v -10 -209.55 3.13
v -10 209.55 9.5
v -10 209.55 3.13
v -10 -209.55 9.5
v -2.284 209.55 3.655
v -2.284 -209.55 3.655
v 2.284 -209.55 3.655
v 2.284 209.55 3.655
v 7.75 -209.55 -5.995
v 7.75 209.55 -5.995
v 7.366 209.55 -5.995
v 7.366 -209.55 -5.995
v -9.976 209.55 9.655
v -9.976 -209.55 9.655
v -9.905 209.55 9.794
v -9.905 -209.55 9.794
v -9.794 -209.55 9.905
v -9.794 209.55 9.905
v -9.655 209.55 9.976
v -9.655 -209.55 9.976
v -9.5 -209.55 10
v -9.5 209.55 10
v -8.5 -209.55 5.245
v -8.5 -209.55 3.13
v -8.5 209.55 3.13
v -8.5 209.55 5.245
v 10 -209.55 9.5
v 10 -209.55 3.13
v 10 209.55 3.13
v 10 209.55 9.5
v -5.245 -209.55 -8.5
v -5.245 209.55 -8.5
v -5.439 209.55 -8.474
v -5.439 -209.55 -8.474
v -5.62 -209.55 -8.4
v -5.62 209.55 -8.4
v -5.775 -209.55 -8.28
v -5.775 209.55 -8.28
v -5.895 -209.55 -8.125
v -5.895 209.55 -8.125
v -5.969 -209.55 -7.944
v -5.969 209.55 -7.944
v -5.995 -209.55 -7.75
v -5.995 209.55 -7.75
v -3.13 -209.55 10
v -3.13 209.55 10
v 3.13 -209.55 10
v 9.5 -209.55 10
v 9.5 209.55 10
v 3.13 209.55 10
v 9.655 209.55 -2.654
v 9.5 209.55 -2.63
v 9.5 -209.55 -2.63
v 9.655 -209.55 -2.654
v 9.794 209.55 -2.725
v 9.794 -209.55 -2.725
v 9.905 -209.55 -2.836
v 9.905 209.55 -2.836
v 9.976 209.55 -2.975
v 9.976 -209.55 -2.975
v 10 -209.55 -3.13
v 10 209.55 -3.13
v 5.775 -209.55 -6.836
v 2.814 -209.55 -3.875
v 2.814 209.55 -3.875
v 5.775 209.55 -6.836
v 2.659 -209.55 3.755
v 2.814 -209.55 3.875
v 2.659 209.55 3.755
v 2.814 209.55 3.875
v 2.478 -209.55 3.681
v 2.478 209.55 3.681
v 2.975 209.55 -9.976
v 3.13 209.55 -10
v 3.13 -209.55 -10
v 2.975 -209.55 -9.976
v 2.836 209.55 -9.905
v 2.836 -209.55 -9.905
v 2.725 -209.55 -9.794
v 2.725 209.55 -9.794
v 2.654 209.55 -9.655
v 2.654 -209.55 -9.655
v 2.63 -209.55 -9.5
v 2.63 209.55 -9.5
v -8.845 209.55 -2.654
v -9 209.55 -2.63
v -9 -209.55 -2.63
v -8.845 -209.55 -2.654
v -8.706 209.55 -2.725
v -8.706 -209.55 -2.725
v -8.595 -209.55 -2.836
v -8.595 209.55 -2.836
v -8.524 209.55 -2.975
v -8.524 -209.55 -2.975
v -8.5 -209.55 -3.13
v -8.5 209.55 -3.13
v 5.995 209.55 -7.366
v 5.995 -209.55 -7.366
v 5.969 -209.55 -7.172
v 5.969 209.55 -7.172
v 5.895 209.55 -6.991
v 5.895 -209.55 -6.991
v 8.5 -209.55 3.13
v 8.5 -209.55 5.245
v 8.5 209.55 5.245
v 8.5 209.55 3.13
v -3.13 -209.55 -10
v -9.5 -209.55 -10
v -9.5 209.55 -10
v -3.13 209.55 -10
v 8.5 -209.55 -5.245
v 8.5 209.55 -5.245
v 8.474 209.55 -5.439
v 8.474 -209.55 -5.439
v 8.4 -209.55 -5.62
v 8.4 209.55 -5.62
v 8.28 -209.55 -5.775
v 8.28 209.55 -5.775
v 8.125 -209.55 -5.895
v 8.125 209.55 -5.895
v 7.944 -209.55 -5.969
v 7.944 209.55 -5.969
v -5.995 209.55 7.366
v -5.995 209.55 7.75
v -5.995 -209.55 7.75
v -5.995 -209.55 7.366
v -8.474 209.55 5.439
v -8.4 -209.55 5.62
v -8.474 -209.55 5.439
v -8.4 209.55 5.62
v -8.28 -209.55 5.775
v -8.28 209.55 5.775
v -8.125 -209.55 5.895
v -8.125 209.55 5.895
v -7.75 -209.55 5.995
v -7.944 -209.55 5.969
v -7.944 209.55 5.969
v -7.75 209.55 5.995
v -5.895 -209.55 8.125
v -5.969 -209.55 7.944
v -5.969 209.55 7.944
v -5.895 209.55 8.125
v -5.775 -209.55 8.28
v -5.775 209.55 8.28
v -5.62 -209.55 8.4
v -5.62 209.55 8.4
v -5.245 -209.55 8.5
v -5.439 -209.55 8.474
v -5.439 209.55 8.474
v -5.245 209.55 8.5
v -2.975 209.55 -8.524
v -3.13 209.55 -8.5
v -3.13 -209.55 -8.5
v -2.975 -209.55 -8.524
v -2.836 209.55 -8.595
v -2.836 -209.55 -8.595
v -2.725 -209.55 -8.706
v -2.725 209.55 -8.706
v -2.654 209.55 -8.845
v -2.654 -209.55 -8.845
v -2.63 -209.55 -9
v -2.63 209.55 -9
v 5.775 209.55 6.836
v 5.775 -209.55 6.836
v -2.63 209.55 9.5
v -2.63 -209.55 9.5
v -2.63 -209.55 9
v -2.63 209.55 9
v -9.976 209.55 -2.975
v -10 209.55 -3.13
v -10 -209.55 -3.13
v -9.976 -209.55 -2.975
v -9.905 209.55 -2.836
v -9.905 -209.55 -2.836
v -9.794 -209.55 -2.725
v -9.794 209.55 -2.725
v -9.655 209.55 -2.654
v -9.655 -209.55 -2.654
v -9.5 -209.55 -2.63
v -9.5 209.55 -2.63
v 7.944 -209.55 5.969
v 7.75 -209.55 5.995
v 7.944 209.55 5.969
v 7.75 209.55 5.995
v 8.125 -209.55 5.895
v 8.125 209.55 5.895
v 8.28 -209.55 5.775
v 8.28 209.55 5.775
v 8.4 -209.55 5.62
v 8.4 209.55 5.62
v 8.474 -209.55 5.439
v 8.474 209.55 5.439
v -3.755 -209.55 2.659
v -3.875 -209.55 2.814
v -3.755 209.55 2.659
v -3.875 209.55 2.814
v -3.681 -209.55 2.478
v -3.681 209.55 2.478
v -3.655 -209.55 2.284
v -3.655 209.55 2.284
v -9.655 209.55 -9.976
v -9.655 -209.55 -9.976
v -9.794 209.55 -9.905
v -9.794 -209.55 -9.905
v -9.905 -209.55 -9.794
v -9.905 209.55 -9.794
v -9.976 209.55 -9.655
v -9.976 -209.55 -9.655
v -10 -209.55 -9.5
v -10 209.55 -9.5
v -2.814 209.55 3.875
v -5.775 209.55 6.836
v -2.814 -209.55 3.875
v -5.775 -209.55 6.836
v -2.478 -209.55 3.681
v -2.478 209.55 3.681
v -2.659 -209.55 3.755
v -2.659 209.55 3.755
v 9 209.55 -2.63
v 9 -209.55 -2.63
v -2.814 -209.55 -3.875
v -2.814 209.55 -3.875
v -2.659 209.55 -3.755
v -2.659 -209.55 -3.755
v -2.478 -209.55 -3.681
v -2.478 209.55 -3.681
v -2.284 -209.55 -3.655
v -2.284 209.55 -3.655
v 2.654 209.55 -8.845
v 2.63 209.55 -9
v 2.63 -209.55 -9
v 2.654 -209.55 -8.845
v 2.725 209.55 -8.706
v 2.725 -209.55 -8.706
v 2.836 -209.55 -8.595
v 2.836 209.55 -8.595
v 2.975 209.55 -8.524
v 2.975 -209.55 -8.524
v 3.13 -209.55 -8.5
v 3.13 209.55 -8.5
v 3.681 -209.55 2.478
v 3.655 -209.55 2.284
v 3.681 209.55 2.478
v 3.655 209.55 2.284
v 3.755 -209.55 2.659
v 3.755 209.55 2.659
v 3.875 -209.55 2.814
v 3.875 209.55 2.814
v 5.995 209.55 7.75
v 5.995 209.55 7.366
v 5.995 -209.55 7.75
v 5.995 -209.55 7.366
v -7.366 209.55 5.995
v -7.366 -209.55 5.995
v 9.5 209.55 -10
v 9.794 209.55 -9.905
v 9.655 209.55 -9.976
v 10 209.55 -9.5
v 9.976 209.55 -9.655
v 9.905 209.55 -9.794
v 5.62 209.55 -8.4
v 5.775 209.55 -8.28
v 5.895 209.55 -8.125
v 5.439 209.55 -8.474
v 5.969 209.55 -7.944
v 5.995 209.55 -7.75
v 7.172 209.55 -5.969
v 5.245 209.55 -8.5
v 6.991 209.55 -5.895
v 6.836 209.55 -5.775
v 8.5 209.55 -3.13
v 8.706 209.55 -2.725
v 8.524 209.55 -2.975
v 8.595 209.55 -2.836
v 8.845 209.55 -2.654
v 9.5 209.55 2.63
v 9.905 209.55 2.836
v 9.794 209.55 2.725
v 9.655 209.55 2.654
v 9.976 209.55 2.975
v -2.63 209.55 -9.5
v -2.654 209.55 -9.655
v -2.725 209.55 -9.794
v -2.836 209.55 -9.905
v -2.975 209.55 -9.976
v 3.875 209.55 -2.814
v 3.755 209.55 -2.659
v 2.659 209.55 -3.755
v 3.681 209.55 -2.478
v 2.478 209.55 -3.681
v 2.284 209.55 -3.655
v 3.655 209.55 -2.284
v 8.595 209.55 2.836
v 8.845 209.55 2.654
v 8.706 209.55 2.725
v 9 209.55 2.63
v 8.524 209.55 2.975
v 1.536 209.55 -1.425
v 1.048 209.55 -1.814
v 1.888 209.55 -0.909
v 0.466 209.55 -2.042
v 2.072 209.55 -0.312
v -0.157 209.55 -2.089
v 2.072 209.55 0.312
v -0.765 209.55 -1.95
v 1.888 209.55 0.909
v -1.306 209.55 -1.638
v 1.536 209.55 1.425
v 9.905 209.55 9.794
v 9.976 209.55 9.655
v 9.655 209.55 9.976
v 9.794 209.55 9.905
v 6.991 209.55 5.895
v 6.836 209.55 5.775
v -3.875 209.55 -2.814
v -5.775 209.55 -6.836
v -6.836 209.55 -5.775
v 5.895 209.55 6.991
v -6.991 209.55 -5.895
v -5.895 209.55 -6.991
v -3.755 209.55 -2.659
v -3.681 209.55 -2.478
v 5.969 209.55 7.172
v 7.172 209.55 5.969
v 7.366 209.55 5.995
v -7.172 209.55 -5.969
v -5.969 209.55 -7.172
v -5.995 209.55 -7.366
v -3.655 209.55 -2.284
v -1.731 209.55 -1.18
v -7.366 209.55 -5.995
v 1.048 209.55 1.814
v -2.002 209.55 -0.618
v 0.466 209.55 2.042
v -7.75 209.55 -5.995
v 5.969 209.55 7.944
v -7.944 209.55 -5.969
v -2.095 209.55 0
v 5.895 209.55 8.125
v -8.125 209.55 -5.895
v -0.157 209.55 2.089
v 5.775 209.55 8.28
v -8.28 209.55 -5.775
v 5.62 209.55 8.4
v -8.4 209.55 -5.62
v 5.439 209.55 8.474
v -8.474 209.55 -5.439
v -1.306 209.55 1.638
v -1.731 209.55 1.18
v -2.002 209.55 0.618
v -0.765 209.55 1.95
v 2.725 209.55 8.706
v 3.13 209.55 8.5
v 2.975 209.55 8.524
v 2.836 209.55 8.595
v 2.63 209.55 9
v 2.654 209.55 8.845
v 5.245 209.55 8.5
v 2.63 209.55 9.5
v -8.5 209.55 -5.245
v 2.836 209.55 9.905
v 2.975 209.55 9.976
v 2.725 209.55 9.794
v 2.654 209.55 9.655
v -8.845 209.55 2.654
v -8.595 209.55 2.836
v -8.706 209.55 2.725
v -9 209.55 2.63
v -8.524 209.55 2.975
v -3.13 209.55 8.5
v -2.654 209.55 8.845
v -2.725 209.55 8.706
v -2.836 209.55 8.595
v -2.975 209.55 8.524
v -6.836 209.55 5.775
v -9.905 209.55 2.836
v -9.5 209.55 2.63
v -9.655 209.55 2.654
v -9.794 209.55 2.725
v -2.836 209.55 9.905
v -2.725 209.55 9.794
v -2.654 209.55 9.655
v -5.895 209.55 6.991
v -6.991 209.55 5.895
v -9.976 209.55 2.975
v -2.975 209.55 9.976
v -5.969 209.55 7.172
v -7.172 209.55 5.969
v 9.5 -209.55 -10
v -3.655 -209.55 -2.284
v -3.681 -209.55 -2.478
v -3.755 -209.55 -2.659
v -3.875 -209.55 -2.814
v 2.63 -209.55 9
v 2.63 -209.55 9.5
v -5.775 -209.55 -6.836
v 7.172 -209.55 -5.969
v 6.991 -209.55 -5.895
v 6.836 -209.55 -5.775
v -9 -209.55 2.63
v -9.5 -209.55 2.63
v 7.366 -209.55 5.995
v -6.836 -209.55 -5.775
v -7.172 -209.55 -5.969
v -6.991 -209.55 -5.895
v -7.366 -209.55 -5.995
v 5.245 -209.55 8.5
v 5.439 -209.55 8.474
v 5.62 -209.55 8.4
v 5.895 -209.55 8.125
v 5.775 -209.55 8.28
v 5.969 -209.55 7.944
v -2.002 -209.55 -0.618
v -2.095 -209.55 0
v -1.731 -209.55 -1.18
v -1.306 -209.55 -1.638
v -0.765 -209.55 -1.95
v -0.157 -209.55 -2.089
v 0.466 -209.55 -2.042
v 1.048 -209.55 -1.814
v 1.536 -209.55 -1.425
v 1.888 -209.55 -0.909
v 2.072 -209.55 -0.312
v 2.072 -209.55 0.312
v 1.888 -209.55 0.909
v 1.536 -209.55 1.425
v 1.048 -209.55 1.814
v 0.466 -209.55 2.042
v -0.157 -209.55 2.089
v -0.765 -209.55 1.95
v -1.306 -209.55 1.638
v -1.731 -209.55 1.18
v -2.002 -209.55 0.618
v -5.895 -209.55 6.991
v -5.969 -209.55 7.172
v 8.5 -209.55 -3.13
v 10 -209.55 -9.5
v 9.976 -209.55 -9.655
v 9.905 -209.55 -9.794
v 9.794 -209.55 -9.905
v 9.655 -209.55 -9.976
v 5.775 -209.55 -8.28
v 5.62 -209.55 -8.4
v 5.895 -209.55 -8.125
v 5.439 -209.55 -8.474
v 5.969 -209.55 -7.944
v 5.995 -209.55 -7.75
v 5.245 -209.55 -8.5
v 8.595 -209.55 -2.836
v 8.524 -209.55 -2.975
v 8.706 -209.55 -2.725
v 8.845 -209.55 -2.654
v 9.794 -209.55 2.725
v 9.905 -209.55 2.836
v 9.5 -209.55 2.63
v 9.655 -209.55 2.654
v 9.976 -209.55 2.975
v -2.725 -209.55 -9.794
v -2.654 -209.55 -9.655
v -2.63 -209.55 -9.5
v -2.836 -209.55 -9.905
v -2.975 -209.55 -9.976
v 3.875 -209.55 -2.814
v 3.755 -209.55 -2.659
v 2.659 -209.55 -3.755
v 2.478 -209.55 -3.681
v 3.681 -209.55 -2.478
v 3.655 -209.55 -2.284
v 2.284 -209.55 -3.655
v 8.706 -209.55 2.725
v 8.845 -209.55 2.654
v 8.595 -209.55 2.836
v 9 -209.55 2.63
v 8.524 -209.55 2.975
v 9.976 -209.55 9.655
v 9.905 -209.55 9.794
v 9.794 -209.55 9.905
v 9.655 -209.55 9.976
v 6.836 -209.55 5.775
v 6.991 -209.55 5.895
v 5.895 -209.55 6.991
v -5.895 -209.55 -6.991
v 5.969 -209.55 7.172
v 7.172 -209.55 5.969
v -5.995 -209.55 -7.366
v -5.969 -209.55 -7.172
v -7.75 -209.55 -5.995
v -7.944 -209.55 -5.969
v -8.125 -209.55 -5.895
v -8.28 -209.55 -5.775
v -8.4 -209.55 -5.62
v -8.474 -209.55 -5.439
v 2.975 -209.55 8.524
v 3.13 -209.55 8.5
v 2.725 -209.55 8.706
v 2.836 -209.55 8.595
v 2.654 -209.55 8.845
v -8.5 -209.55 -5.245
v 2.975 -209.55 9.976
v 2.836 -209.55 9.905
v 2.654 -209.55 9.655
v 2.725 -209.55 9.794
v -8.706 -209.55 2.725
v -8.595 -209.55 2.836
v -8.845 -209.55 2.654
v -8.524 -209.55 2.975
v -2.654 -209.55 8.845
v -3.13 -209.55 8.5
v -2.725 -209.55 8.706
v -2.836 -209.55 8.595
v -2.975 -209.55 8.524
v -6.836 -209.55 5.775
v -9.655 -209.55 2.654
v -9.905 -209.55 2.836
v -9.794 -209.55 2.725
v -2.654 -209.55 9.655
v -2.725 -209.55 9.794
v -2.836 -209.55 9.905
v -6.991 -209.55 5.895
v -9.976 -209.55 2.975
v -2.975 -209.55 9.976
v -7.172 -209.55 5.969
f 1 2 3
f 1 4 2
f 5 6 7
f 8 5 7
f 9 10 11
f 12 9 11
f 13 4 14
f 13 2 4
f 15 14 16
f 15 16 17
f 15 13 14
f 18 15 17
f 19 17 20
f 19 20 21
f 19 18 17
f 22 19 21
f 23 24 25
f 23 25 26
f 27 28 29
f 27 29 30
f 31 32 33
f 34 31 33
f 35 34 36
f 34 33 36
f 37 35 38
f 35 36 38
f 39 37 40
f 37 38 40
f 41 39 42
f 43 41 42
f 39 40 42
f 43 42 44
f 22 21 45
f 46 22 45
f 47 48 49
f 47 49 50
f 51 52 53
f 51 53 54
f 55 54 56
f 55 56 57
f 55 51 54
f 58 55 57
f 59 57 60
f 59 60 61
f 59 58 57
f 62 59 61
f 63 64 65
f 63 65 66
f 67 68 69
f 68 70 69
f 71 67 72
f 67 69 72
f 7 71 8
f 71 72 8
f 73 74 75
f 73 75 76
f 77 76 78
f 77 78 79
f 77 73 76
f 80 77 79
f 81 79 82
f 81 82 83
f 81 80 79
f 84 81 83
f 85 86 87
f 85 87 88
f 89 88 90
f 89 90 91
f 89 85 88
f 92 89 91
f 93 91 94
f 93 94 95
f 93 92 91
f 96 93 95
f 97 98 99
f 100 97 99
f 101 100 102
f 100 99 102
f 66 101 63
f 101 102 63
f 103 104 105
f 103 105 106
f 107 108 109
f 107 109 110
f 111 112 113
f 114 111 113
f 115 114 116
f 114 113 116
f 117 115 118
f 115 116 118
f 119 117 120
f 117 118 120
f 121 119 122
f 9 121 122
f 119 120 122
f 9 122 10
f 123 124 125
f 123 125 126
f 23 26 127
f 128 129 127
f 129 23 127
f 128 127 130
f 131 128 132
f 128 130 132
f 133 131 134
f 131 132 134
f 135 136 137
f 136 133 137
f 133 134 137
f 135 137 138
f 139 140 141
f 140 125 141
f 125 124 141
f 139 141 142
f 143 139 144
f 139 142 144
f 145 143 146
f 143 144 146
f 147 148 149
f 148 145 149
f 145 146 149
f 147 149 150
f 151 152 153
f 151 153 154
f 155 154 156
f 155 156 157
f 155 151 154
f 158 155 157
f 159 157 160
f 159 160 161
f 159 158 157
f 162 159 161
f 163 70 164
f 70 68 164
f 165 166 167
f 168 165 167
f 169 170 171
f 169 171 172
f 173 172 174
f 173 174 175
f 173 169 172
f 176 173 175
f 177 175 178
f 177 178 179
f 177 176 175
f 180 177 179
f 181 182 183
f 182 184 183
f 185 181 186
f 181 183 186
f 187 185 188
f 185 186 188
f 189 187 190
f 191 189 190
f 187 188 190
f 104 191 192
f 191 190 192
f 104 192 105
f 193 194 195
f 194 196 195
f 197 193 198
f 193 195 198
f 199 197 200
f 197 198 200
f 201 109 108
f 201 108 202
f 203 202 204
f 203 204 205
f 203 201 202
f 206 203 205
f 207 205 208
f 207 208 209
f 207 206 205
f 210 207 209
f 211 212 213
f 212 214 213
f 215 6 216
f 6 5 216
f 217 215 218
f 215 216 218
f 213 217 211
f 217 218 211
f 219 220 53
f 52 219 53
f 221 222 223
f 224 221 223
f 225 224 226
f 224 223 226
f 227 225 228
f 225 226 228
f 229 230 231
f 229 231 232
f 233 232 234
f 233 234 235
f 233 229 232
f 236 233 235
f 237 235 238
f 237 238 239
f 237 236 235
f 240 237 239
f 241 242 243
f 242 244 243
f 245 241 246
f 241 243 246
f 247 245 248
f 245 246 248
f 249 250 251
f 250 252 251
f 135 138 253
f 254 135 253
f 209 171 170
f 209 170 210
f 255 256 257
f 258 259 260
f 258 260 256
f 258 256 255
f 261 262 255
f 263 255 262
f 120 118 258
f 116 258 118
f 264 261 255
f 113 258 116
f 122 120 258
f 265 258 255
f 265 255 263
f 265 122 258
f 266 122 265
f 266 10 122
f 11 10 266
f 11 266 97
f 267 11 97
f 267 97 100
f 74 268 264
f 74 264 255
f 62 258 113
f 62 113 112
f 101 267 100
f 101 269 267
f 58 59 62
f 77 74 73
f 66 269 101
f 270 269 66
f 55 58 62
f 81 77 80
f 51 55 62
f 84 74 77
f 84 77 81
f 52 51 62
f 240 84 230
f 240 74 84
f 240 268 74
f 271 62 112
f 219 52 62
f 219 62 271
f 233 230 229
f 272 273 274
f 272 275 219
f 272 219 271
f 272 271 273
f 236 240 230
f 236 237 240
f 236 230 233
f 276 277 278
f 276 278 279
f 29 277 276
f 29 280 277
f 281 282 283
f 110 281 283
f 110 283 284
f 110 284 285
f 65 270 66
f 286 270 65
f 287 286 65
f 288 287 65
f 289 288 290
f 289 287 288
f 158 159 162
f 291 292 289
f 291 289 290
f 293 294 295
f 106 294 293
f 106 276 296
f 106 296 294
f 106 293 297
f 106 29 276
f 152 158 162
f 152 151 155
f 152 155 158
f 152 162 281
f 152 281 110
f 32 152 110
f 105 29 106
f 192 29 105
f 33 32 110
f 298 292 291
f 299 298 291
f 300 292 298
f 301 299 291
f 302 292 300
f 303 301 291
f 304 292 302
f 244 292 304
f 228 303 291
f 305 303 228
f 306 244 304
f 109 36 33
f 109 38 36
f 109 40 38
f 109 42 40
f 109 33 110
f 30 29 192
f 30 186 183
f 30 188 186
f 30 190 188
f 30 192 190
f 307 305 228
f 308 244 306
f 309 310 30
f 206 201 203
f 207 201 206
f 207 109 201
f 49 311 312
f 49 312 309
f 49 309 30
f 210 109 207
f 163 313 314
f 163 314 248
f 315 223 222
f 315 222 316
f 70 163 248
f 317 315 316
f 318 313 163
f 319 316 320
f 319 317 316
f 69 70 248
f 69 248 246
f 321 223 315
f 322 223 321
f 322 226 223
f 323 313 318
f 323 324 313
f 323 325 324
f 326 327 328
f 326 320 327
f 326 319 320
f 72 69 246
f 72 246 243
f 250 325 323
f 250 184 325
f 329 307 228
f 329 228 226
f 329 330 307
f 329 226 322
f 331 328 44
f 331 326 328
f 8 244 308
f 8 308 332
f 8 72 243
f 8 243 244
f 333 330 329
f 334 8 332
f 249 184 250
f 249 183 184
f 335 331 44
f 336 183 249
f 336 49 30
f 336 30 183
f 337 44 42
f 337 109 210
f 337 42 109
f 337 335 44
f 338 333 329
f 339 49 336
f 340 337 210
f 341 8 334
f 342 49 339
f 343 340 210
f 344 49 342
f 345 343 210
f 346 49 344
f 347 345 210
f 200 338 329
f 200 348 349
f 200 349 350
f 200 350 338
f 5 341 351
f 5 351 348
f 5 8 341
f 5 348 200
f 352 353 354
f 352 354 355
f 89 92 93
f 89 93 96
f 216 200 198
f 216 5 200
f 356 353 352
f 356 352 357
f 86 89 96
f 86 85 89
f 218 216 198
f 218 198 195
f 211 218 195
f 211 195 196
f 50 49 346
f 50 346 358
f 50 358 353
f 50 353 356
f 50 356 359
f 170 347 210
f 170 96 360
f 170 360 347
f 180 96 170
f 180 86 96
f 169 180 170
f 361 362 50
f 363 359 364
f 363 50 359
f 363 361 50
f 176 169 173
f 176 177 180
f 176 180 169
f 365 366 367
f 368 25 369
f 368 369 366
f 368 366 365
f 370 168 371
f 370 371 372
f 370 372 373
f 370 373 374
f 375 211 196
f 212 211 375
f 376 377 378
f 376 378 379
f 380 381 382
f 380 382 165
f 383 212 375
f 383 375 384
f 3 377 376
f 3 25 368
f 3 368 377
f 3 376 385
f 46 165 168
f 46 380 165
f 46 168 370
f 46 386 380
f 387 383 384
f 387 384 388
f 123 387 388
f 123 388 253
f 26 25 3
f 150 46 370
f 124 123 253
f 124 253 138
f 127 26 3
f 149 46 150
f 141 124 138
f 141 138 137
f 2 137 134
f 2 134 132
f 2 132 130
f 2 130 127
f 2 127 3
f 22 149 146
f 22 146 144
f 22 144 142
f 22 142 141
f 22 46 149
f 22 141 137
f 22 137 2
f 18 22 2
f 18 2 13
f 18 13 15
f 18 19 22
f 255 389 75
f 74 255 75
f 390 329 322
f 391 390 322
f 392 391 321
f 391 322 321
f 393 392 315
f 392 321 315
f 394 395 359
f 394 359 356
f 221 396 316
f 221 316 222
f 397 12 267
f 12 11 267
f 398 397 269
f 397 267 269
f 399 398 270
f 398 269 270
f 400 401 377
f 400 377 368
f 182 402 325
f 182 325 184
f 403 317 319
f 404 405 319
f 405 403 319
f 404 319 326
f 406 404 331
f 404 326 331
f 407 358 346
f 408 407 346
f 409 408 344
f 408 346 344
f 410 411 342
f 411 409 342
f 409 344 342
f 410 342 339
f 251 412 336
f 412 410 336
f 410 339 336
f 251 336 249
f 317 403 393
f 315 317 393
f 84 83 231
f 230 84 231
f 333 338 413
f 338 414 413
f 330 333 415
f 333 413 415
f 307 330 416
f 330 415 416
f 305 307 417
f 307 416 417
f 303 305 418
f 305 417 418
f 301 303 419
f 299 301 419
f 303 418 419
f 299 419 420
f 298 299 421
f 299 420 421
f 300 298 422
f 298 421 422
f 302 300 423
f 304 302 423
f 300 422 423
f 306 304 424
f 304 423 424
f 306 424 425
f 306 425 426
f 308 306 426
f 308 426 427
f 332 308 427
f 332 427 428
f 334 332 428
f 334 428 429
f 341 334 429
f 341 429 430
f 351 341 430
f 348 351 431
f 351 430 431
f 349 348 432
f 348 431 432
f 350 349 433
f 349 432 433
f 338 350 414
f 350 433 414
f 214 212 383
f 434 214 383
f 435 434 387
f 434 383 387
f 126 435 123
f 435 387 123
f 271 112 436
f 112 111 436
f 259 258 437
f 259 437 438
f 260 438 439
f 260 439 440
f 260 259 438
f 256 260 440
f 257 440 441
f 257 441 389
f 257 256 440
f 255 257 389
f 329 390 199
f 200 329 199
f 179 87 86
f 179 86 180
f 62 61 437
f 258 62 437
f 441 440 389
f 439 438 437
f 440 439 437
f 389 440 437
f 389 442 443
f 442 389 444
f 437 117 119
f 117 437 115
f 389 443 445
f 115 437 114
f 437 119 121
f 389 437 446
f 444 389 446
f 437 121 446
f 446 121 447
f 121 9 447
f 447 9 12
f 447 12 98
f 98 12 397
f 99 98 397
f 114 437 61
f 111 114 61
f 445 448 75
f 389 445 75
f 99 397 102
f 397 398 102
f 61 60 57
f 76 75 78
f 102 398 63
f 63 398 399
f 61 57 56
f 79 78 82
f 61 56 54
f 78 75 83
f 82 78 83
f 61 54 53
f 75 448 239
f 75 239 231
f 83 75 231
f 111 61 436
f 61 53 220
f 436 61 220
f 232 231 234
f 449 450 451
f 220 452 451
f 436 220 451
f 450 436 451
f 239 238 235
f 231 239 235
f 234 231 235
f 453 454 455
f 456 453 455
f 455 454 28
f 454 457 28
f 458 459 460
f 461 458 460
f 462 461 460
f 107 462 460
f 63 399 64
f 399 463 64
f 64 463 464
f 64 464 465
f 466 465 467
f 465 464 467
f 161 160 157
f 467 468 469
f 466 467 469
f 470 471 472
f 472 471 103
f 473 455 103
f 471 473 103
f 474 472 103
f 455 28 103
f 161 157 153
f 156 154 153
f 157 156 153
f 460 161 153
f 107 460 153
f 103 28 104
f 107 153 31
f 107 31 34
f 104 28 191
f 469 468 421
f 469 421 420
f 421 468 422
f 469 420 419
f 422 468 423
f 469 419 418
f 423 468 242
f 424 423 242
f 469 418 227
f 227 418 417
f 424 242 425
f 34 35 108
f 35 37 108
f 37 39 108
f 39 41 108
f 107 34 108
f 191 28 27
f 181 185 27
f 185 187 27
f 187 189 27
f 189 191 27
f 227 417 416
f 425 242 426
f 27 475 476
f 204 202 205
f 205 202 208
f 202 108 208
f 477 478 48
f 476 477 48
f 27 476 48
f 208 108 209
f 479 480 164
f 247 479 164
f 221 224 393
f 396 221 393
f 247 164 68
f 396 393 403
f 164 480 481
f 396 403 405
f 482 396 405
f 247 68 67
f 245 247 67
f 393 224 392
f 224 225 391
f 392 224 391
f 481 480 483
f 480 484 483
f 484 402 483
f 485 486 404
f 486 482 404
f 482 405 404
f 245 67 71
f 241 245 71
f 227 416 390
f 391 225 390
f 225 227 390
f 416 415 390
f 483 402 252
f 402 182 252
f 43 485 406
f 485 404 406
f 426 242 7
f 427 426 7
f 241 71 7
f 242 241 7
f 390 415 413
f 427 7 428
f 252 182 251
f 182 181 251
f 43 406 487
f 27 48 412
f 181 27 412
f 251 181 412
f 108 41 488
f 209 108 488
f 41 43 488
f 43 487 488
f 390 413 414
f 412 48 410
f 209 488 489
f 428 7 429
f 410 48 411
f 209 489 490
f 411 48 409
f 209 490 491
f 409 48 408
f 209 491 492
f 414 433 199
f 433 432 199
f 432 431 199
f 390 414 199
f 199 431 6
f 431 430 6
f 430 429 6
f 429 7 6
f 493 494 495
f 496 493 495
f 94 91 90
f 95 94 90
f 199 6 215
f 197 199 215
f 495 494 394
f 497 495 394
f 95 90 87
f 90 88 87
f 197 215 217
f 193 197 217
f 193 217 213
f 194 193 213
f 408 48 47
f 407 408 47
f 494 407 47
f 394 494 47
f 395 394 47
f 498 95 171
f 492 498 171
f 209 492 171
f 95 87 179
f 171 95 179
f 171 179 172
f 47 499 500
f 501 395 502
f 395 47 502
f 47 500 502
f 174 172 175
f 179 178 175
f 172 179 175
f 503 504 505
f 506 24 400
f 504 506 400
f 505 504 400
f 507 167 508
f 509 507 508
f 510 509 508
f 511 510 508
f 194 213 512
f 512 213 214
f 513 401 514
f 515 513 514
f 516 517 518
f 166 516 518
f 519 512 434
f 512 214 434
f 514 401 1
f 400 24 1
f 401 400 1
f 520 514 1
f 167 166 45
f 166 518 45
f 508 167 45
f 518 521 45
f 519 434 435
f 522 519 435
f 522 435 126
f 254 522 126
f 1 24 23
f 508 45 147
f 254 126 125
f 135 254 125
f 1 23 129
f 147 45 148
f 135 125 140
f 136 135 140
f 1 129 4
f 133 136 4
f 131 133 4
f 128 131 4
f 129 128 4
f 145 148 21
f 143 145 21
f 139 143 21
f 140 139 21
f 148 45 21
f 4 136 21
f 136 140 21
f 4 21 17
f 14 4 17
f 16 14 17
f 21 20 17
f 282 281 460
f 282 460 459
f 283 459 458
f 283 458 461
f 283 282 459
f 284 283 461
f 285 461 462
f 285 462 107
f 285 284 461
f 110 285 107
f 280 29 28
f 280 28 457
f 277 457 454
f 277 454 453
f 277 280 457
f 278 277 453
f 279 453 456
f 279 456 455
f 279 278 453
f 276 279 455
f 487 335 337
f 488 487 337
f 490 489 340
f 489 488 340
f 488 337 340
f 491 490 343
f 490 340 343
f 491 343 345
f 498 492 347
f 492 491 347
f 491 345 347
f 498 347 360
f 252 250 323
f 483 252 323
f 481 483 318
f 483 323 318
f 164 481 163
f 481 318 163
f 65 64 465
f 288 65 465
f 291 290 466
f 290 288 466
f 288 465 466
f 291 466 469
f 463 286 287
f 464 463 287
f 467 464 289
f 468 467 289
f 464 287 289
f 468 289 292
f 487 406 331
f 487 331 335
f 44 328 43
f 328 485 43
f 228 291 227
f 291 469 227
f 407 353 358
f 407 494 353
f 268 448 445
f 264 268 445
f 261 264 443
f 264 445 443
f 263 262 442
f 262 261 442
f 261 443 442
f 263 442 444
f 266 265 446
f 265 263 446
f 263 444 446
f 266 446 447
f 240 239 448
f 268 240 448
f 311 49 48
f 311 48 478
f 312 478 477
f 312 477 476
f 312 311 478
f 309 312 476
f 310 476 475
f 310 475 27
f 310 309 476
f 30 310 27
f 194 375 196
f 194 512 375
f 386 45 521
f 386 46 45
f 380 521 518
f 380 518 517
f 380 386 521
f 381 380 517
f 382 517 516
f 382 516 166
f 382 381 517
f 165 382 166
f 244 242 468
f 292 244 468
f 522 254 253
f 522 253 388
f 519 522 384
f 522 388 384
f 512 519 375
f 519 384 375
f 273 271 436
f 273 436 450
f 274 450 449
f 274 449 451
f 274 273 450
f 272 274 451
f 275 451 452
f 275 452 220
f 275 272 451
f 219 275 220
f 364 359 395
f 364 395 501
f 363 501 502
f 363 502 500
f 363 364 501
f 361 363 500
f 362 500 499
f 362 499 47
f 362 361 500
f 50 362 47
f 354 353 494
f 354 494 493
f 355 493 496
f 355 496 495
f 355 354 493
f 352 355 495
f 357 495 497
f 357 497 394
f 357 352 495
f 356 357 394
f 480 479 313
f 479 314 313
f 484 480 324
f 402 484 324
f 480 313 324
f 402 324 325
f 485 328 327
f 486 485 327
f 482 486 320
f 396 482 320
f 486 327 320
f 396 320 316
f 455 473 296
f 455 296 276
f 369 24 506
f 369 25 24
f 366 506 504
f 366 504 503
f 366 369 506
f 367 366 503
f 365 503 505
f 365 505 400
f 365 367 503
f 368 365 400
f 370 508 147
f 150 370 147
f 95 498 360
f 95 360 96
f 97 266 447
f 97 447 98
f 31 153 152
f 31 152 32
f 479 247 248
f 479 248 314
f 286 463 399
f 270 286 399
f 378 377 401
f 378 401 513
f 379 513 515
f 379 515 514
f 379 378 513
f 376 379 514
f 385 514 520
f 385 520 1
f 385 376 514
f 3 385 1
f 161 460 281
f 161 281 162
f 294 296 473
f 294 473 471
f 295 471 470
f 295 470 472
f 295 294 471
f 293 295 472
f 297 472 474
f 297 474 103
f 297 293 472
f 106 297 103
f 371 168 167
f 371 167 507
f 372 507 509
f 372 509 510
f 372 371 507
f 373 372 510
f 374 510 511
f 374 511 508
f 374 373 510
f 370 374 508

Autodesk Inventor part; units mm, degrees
ref_plane "YZ Plane" through (0, 0, 0) normal (1, 0, 0) x (0, 1, 0)
ref_plane "XZ Plane" through (0, 0, 0) normal (0, 1, 0) x (-1, 0, 0)
ref_plane "XY Plane" through (0, 0, 0) normal (0, 0, 1) x (1, 0, 0)
sketch "Sketch1" plane through (0, 0, 0) normal (0, 1, 0) x (-1, 0, 0)
  line L0 (0, -14) -> (0, 14) projected
  line L1 (-14, 0) -> (14, 0) projected
  line L2 (14, 0) -> (-14, 0) projected
  line L3 (0, -14) -> (0, 14) projected
  line L4 (2.5943, 3.655) -> (-2.5943, 3.655)
  line L5 (-3.655, 2.5943) -> (-3.655, -2.5943)
  line L6 (-2.5943, -3.655) -> (2.5943, -3.655)
  line L7 (3.655, -2.5943) -> (3.655, 2.5943)
  line L8 (-3.655, 3.655) -> (3.655, -3.655) construction
  line L9 (10, 10) -> (10, 2.63)
  line L10 (10, 2.63) -> (8.5, 2.63)
  line L11 (10, 10) -> (2.63, 10)
  line L12 (2.63, 10) -> (2.63, 8.5)
  line L13 (-10, 10) -> (-2.63, 10)
  line L14 (-2.63, 10) -> (-2.63, 8.5)
  line L15 (-10, 8.5) -> (-10, 10)
  line L16 (-10, 10) -> (-8.5, 10)
  line L17 (-8.5, 2.63) -> (-10, 2.63)
  line L18 (-10, 2.63) -> (-10, 10)
  line L19 (-10, -10) -> (-8.5, -10)
  line L20 (-8.5, -2.63) -> (-10, -2.63)
  line L21 (-10, -2.63) -> (-10, -10)
  line L22 (-10, -10) -> (-2.63, -10)
  line L23 (-2.63, -10) -> (-2.63, -8.5)
  line L24 (-10, -8.5) -> (-10, -10)
  line L25 (10, -10) -> (8.5, -10)
  line L26 (8.5, -2.63) -> (10, -2.63)
  line L27 (10, -2.63) -> (10, -10)
  line L28 (10, -10) -> (2.63, -10)
  line L29 (2.63, -10) -> (2.63, -8.5)
  line L30 (10, -8.5) -> (10, -10)
  circle A0 centre (0, 0) radius 2.095
  line L31 (5.995, -10) -> (2.63, -10)
  line L32 (-2.63, -10) -> (-5.995, -10)
  line L33 (10, -10) -> (2.63, -10)
  line L34 (-2.63, -10) -> (-10, -10)
  line L35 (10, -5.995) -> (10, -2.63)
  line L36 (10, 2.63) -> (10, 5.995)
  line L37 (10, 10) -> (10, 2.63)
  line L38 (10, -2.63) -> (10, -10)
  line L39 (-5.995, 10) -> (-2.63, 10)
  line L40 (2.63, 10) -> (5.995, 10)
  line L41 (-10, 10) -> (-2.63, 10)
  line L42 (2.63, 10) -> (10, 10)
  line L43 (-10, 5.995) -> (-10, 2.63)
  line L44 (-10, -2.63) -> (-10, -5.995)
  line L45 (-10, -10) -> (-10, -2.63)
  line L46 (-10, 2.63) -> (-10, 10)
  line L47 (-2.63, -8.5) -> (-5.995, -8.5)
  line L48 (-8.5, -5.995) -> (-8.5, -2.63)
  line L49 (-8.5, -5.995) -> (-7.0557, -5.995)
  line L50 (-5.995, -8.5) -> (-5.995, -7.0557)
  line L51 (-5.995, 7.0557) -> (-5.995, 8.5)
  line L52 (2.63, 8.5) -> (5.995, 8.5)
  line L53 (8.5, 2.63) -> (8.5, 5.995)
  line L54 (8.5, 5.995) -> (7.0557, 5.995)
  line L55 (5.995, 8.5) -> (5.995, 7.0557)
  line L56 (2.63, -8.5) -> (5.995, -8.5)
  line L57 (9.5607, -8.5) -> (10, -8.5)
  line L58 (8.5, -10) -> (8.5, -9.5607)
  line L59 (8.5, -5.995) -> (8.5, -2.63)
  line L60 (7.0557, -5.995) -> (8.5, -5.995)
  line L61 (5.995, -7.0557) -> (5.995, -8.5)
  line L62 (3.655, 3.655) -> (-0.5303, -0.5303) construction
  line L63 (-1.4814, -1.4814) -> (-3.655, -3.655) construction
  line L64 (-8.5, 10) -> (-8.5, 9.5607)
  line L65 (-8.5, 5.995) -> (-8.5, 2.63)
  line L66 (-2.63, 8.5) -> (-5.995, 8.5)
  line L67 (-9.5607, 8.5) -> (-10, 8.5)
  line L68 (-7.0557, 5.995) -> (-8.5, 5.995)
  line L69 (-3.655, 2.5943) -> (-7.0557, 5.995)
  line L70 (-2.5943, 3.655) -> (-5.995, 7.0557)
  line L71 (5.995, 7.0557) -> (2.5943, 3.655)
  line L72 (7.0557, 5.995) -> (3.655, 2.5943)
  line L73 (7.0557, -5.995) -> (3.655, -2.5943)
  line L74 (5.995, -7.0557) -> (2.5943, -3.655)
  line L75 (-2.5943, -3.655) -> (-5.995, -7.0557)
  line L76 (-3.655, -2.5943) -> (-7.0557, -5.995)
  dimension "d26" = 4.19
  dimension "d0" = 20
  dimension "d1" = 20
  dimension "d2" = 7.31
  dimension "d3" = 7.31
  dimension "d4" = 20
  dimension "d5" = 11.99
  dimension "d6" = 11.99
  dimension "d11" = 7.37
  dimension "d12" = 1.5
  dimension "d13" = 7.37
  dimension "d14" = 1.5
  dimension "d15" = 7.37
  dimension "d16" = 1.5
  dimension "d17" = 7.37
  dimension "d18" = 1.5
  dimension "d19" = 7.37
  dimension "d20" = 7.37
  dimension "d21" = 1.5
  dimension "d22" = 1.5
  dimension "d23" = 7.37
  dimension "d24" = 7.37
  dimension "d25" = 1.5
extrude "Extrusion1" add sketch "Sketch1" along normal mid plane 419.1 contours L6 L75 L50 L47 L23 L22 L19 L21 L20 L48 L49 L76 L5 L1 A0 L0 | L0 A0 L1 L7 L73 L60 L59 L26 L27 L25 L28 L29 L56 L61 L74 L6 | L1 L5 L69 L68 L65 L17 L18 L15 L13 L14 L66 L51 L70 L4 L0 A0 | A0 L0 L4 L71 L55 L52 L12 L11 L9 L10 L53 L54 L72 L7 L1
fillet "Fillet1" radius 0.5 20 edges at (10, 0, 10) (2.63, 0, 10) (-2.63, 0, 10) (-2.63, 0, 8.5) (10, 0, 2.63) (8.5, 0, 2.63) (10, 0, -2.63) (8.5, 0, -2.63) (10, 0, -10) (2.63, 0, -8.5) (-2.63, 0, -10) (-2.63, 0, -8.5) (2.63, 0, -10) (-10, 0, -10) (-8.5, 0, -2.63) (-10, 0, -2.63) (-8.5, 0, 2.63) (-10, 0, 2.63) (-10, 0, 10) (2.63, 0, 8.5)
fillet "Fillet2" radius 0.75 24 edges at (-7.0557, 0, 5.995) (-3.655, 0, 2.5943) (-8.5, 0, -5.995) (-7.0557, 0, -5.995) (-5.995, 0, -8.5) (3.655, 0, -2.5943) (7.0557, 0, -5.995) (-2.5943, 0, 3.655) (-5.995, 0, 7.0557) (3.655, 0, 2.5943) (7.0557, 0, 5.995) (8.5, 0, 5.995) (8.5, 0, -5.995) (2.5943, 0, 3.655) (5.995, 0, 7.0557) (5.995, 0, 8.5) (-5.995, 0, 8.5) (-8.5, 0, 5.995) (2.5943, 0, -3.655) (5.995, 0, -7.0557) (5.995, 0, -8.5) (-5.995, 0, -7.0557) (-2.5943, 0, -3.655) (-3.655, 0, -2.5943)
properties part number "pro20in" material "Aluminum 6061"
